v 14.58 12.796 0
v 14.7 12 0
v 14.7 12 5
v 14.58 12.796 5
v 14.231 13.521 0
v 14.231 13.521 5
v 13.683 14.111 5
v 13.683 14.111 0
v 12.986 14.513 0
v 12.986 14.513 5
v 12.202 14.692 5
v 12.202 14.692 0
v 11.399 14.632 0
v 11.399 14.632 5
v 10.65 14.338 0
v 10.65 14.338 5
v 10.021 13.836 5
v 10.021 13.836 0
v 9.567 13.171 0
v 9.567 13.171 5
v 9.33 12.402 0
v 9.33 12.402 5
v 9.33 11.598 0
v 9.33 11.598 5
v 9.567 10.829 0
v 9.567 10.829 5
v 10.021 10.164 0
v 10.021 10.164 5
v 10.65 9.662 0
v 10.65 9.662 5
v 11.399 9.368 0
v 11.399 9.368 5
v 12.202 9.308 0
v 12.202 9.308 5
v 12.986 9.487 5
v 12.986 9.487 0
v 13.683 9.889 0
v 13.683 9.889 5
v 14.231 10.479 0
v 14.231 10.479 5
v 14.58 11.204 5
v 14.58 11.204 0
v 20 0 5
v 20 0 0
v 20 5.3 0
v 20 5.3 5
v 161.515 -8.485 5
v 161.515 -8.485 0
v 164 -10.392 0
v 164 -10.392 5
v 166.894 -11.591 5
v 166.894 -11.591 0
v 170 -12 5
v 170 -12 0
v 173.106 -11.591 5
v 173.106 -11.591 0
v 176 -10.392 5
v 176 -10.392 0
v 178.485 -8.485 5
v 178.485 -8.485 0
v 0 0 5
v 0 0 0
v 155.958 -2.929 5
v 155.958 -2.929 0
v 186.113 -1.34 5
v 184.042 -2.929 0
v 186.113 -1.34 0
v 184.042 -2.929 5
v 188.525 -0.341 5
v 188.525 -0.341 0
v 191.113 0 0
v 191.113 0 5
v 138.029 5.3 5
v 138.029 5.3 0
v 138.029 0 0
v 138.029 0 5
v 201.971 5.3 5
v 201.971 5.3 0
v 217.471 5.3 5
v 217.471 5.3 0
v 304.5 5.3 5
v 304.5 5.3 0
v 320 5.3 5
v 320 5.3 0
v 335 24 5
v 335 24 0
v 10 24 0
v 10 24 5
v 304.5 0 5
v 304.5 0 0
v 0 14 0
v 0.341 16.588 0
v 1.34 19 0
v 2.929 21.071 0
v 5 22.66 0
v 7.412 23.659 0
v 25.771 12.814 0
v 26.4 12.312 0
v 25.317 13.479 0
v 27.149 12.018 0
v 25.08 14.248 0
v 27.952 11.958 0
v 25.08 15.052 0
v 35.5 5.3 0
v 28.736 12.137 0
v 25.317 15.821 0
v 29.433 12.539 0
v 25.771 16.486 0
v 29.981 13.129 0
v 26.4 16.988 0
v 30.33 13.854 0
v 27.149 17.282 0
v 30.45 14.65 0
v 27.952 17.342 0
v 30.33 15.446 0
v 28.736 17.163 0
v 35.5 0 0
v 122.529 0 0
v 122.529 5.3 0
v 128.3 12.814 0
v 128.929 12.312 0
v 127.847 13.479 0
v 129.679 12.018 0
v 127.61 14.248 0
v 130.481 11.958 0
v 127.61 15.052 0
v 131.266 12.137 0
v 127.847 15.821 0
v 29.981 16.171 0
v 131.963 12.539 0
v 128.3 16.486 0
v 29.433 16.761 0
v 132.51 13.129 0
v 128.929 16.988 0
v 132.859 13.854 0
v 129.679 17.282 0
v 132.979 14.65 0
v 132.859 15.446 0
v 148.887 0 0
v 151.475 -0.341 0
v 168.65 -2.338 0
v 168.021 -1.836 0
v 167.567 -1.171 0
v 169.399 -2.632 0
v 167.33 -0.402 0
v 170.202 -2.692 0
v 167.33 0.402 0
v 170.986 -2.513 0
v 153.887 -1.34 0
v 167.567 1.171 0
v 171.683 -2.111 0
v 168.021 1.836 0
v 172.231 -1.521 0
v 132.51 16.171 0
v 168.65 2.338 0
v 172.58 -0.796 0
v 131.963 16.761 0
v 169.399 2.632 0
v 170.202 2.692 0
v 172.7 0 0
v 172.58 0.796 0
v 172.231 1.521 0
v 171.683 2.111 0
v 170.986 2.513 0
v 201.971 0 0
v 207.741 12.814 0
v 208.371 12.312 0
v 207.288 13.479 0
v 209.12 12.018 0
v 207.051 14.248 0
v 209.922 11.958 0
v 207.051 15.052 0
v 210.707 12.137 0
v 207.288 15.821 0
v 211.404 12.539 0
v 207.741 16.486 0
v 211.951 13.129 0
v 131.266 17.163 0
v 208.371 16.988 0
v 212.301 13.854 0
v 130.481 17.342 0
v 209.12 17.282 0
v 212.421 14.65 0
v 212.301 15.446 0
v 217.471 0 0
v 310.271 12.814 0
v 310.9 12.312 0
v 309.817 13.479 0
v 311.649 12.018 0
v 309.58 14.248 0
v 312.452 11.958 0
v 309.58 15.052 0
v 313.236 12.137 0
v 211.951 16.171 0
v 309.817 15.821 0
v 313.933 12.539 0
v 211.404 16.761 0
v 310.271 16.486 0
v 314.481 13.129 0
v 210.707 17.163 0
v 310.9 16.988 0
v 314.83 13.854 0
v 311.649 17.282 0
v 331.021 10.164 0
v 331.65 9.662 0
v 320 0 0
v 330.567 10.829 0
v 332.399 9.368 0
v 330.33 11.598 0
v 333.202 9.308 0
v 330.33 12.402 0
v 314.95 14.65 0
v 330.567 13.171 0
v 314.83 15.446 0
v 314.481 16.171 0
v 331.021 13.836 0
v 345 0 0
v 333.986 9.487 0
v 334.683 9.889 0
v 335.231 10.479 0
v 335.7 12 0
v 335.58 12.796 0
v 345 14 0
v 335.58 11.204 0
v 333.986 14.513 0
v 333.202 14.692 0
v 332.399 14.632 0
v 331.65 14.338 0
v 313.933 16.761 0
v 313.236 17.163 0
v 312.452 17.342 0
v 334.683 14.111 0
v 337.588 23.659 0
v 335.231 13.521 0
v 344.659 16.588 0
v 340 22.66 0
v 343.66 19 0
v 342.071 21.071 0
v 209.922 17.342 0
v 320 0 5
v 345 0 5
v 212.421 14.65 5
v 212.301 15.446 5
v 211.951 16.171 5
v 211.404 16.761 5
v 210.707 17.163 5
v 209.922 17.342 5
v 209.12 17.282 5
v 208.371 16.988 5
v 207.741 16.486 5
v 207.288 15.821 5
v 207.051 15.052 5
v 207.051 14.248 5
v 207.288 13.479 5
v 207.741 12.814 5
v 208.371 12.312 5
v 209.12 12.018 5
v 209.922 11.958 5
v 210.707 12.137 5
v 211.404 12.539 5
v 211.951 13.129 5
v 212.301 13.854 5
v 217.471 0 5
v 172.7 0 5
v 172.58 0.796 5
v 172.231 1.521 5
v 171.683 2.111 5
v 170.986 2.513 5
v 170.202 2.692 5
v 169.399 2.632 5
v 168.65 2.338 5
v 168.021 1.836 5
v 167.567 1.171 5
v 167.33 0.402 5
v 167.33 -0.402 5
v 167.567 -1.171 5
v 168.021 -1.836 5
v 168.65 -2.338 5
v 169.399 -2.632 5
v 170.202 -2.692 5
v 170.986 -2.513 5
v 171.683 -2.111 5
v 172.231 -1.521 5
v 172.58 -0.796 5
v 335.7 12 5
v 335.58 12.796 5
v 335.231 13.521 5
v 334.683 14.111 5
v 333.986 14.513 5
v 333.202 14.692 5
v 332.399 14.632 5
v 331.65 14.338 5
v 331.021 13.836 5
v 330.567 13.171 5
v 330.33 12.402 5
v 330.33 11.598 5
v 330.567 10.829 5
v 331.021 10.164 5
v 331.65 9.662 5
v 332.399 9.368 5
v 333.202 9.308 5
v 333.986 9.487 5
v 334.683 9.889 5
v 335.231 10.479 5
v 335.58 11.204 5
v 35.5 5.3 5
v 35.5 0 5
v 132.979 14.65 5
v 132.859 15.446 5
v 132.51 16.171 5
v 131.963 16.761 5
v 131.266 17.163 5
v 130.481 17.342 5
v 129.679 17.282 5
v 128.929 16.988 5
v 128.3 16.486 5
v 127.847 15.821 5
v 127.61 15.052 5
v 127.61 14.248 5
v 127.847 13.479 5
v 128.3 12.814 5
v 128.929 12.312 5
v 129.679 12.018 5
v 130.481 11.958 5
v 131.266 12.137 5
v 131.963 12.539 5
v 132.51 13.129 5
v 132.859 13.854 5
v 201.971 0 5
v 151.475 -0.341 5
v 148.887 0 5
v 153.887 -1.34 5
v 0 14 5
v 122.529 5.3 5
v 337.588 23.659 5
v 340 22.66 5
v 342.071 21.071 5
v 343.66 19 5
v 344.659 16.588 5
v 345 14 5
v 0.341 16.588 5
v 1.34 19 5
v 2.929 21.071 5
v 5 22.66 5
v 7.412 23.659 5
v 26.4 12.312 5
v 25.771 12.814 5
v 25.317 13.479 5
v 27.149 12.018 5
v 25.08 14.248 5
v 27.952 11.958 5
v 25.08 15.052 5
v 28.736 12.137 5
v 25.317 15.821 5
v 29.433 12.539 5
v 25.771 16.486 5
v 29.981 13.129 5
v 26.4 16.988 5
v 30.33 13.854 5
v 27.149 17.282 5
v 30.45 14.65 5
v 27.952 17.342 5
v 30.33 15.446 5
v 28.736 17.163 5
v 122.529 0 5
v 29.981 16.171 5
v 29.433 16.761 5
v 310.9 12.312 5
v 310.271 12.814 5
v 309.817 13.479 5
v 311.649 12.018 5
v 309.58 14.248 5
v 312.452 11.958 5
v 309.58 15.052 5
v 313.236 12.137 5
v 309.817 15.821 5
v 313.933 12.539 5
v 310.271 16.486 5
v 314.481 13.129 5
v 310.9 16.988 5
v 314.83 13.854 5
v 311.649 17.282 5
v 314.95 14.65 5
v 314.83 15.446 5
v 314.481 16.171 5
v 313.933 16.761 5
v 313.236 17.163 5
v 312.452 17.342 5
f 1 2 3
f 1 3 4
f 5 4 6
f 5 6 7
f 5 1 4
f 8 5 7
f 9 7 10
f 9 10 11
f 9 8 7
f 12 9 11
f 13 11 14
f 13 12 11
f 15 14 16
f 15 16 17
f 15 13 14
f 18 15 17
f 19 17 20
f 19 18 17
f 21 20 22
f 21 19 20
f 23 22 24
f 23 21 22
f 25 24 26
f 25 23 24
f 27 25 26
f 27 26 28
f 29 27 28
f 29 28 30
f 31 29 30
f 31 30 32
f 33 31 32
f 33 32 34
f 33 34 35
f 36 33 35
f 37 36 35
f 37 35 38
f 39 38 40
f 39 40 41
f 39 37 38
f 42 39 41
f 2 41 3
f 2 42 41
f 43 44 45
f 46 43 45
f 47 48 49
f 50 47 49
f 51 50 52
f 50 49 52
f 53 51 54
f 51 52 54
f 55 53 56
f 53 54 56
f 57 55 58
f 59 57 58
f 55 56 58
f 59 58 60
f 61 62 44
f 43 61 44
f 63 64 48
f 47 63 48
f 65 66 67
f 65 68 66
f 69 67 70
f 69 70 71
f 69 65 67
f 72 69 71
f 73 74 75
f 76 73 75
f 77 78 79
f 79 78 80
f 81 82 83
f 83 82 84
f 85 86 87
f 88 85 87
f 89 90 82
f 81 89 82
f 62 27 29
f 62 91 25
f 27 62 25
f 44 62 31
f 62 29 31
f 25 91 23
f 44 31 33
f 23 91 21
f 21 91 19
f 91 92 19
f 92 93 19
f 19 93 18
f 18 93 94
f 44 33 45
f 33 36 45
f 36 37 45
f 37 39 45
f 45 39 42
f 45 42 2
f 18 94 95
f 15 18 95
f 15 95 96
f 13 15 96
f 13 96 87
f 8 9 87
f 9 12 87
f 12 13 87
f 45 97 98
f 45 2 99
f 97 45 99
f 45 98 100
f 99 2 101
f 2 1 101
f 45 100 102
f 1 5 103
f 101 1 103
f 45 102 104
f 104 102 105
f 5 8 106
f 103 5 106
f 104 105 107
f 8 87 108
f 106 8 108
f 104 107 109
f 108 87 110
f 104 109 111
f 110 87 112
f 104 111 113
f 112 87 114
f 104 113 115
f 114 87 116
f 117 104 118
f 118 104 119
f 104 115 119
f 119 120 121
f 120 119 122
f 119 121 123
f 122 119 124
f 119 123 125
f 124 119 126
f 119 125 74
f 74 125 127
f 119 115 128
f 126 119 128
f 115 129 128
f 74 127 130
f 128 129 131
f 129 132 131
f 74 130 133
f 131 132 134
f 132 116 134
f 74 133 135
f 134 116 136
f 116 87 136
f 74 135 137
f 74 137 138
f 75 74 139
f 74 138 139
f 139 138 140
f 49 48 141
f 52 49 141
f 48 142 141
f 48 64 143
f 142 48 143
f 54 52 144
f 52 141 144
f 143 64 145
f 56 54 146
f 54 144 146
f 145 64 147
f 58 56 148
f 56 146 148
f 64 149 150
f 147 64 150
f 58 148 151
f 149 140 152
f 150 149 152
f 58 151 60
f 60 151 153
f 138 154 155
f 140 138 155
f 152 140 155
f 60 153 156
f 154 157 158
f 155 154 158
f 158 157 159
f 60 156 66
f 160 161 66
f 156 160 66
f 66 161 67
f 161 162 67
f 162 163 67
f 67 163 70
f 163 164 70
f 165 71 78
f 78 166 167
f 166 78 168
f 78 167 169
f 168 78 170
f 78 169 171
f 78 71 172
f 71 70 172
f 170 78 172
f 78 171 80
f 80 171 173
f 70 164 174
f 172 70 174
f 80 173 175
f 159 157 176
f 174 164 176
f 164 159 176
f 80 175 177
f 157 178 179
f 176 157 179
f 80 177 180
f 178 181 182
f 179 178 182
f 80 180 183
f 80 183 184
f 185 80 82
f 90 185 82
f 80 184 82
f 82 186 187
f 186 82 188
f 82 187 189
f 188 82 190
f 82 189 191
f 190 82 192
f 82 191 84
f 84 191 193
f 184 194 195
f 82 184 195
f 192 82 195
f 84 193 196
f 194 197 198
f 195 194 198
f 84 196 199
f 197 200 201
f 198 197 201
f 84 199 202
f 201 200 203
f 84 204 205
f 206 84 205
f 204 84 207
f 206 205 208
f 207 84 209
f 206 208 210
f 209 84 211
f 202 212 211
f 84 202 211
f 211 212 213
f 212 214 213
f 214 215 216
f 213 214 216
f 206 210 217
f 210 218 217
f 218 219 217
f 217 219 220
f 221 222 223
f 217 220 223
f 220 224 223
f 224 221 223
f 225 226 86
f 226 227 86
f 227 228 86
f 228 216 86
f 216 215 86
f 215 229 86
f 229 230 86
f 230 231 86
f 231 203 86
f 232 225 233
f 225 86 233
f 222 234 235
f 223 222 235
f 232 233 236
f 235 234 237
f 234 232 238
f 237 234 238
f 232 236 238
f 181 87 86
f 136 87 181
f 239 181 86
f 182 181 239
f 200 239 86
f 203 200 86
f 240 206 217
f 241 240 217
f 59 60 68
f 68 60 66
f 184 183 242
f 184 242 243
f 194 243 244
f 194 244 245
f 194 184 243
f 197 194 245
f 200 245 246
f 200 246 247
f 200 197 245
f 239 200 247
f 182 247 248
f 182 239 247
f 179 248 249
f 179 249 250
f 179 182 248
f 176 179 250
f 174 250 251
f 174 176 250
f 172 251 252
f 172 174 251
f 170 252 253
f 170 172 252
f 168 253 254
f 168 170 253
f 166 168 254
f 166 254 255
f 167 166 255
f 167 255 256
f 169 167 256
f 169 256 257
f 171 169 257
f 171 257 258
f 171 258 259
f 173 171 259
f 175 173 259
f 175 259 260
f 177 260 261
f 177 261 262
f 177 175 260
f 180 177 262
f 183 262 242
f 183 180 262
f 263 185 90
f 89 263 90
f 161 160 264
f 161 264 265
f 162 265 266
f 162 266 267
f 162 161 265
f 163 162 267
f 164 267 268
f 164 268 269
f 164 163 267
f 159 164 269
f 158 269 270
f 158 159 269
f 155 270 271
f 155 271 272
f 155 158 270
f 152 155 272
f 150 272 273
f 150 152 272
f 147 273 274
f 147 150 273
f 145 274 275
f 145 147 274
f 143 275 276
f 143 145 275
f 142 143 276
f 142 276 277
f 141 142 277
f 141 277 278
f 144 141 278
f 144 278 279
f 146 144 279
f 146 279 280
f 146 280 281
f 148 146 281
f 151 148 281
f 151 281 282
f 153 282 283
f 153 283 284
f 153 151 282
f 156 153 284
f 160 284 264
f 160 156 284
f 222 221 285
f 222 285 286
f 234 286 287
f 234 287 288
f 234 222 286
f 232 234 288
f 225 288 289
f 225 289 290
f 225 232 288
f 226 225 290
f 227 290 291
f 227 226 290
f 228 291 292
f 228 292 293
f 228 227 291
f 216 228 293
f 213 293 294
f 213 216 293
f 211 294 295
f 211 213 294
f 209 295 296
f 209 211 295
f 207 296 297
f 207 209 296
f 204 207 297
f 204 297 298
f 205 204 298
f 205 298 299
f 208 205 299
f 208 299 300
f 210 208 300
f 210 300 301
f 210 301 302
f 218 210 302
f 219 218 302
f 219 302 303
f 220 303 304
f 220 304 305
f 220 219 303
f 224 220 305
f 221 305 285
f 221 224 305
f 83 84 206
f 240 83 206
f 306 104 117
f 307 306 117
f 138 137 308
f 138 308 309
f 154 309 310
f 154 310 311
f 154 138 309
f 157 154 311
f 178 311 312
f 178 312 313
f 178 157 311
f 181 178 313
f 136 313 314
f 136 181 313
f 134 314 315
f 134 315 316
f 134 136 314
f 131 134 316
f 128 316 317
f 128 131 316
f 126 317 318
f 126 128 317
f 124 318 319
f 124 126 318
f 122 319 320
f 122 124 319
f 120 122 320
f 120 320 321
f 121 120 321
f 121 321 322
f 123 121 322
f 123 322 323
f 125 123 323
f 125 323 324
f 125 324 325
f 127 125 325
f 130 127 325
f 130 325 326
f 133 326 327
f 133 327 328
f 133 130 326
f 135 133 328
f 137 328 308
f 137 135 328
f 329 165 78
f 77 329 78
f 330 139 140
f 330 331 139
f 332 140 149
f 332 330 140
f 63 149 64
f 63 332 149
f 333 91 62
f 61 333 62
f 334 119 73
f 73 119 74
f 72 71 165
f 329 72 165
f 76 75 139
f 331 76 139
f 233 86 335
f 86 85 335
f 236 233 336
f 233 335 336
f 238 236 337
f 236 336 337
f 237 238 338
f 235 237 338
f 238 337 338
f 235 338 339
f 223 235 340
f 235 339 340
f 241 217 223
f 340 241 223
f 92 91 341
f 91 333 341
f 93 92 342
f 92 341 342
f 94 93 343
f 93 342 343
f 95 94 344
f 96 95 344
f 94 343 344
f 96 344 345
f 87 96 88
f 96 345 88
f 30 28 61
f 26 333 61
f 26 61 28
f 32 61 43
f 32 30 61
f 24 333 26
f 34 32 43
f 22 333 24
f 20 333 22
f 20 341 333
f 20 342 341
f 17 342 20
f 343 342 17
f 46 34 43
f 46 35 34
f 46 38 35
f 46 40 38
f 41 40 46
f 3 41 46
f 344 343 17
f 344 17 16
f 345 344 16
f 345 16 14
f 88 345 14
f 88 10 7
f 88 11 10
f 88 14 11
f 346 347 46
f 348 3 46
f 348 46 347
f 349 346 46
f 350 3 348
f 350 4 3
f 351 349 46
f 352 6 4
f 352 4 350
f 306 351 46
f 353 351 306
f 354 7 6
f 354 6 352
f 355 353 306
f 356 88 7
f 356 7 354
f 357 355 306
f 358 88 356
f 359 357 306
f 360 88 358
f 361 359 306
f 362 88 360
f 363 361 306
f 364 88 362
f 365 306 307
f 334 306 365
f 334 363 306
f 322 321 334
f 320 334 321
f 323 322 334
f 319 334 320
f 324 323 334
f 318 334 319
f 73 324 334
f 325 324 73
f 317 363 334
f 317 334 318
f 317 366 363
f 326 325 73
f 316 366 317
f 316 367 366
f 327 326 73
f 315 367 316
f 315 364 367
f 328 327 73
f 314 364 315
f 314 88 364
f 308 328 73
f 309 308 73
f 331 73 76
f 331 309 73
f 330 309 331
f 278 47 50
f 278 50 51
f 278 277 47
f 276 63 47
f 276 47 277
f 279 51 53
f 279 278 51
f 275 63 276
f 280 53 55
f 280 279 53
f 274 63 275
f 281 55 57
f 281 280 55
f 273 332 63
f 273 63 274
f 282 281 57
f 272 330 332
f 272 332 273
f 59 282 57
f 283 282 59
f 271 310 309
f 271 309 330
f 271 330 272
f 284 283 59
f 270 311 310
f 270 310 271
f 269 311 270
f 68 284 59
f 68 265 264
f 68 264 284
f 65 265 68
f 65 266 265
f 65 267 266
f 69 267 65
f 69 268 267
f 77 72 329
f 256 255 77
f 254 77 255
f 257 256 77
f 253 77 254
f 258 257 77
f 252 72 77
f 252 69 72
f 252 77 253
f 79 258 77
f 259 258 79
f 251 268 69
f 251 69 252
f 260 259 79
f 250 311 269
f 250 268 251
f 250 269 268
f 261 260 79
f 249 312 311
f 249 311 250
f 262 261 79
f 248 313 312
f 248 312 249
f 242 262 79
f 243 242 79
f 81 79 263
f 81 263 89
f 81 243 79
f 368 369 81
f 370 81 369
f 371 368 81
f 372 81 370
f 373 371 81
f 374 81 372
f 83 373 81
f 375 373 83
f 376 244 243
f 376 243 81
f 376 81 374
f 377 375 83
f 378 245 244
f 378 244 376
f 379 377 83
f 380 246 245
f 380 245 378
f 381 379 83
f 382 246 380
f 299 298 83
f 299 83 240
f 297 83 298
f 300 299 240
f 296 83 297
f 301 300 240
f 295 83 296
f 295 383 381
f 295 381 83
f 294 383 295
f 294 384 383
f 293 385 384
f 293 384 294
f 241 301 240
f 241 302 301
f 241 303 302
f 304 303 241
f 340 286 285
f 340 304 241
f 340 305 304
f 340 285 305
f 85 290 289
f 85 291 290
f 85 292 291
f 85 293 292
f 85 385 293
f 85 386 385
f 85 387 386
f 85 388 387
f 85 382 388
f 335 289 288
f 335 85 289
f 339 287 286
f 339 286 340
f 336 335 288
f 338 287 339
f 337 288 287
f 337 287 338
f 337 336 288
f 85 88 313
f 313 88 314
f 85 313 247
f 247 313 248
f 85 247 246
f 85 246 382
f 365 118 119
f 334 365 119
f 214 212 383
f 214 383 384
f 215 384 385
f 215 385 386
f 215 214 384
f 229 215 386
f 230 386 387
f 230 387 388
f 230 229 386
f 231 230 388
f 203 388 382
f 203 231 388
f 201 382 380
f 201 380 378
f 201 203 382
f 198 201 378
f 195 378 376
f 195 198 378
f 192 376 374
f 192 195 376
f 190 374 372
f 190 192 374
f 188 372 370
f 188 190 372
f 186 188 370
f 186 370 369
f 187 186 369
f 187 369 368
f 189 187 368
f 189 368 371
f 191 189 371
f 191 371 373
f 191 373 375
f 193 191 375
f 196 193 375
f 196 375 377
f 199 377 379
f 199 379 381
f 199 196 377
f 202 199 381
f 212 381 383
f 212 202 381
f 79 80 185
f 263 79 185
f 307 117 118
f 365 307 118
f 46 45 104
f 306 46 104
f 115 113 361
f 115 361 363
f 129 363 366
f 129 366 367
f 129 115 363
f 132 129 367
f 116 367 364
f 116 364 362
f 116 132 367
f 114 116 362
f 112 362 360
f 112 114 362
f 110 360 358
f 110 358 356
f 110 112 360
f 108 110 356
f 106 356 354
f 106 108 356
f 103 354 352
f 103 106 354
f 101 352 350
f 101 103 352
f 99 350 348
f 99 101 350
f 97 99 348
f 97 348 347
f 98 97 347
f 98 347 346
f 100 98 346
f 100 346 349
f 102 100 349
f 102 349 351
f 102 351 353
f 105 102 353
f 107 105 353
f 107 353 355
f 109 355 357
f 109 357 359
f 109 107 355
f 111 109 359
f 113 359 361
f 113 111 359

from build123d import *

# Parameters (mm, degrees)
SKETCH1_R           = 2.7
BOSS_EXTRUDE1_DEPTH = 5
FILLET1_R           = 10


with BuildPart() as part:
    # Sketch1 → Boss-Extrude1 (new body)
    with BuildSketch(Plane.XY):
        with BuildLine():
            Line((0, 0), (20, 0))
            Line((20, 0), (20, 5.3))
            Line((20, 5.3), (35.5, 5.3))
            Line((35.5, 5.3), (35.5, 0))
            Line((35.5, 0), (122.529437252, 0))
            Line((122.529437252, 0), (122.529437252, 5.3))
            Line((122.529437252, 5.3), (138.029437252, 5.3))
            Line((138.029437252, 5.3), (138.029437252, 0))
            Line((138.029437252, 0), (153.029437252, 0))
            Line((153.029437252, 0), (161.514718626, -8.485281374))
            ThreePointArc((161.514718626, -8.485281374), (170, -12), (178.485281374, -8.485281374))
            Line((178.485281374, -8.485281374), (186.970562748, 0))
            Line((186.970562748, 0), (201.970562748, 0))
            Line((201.970562748, 0), (201.970562748, 5.3))
            Line((201.970562748, 5.3), (217.470562748, 5.3))
            Line((217.470562748, 5.3), (217.470562748, 0))
            Line((217.470562748, 0), (304.5, 0))
            Line((304.5, 0), (304.5, 5.3))
            Line((304.5, 5.3), (320, 5.3))
            Line((320, 5.3), (320, 0))
            Line((320, 0), (345, 0))
            Line((345, 0), (345, 24))
            Line((345, 24), (0, 24))
            Line((0, 24), (0, 0))
        make_face()
        with Locations((170, 0)):
            Circle(SKETCH1_R, mode=Mode.SUBTRACT)
        with Locations((12, 12)):
            Circle(SKETCH1_R, mode=Mode.SUBTRACT)
        with Locations((333, 12)):
            Circle(SKETCH1_R, mode=Mode.SUBTRACT)
        with Locations((27.75, 14.65)):
            Circle(SKETCH1_R, mode=Mode.SUBTRACT)
        with Locations((130.279437252, 14.65)):
            Circle(SKETCH1_R, mode=Mode.SUBTRACT)
        with Locations((209.720562748, 14.65)):
            Circle(SKETCH1_R, mode=Mode.SUBTRACT)
        with Locations((312.25, 14.65)):
            Circle(SKETCH1_R, mode=Mode.SUBTRACT)
    extrude(amount=BOSS_EXTRUDE1_DEPTH)

    # Fillet1
    fillet1_edges = [part.edges().sort_by_distance(p)[0] for p in [
        (0, 24, 2.5),
        (345, 24, 2.5),
        (186.970562748, 0, 2.5),
        (153.029437252, 0, 2.5),
    ]]
    fillet(fillet1_edges, radius=FILLET1_R)


solid = part.part
